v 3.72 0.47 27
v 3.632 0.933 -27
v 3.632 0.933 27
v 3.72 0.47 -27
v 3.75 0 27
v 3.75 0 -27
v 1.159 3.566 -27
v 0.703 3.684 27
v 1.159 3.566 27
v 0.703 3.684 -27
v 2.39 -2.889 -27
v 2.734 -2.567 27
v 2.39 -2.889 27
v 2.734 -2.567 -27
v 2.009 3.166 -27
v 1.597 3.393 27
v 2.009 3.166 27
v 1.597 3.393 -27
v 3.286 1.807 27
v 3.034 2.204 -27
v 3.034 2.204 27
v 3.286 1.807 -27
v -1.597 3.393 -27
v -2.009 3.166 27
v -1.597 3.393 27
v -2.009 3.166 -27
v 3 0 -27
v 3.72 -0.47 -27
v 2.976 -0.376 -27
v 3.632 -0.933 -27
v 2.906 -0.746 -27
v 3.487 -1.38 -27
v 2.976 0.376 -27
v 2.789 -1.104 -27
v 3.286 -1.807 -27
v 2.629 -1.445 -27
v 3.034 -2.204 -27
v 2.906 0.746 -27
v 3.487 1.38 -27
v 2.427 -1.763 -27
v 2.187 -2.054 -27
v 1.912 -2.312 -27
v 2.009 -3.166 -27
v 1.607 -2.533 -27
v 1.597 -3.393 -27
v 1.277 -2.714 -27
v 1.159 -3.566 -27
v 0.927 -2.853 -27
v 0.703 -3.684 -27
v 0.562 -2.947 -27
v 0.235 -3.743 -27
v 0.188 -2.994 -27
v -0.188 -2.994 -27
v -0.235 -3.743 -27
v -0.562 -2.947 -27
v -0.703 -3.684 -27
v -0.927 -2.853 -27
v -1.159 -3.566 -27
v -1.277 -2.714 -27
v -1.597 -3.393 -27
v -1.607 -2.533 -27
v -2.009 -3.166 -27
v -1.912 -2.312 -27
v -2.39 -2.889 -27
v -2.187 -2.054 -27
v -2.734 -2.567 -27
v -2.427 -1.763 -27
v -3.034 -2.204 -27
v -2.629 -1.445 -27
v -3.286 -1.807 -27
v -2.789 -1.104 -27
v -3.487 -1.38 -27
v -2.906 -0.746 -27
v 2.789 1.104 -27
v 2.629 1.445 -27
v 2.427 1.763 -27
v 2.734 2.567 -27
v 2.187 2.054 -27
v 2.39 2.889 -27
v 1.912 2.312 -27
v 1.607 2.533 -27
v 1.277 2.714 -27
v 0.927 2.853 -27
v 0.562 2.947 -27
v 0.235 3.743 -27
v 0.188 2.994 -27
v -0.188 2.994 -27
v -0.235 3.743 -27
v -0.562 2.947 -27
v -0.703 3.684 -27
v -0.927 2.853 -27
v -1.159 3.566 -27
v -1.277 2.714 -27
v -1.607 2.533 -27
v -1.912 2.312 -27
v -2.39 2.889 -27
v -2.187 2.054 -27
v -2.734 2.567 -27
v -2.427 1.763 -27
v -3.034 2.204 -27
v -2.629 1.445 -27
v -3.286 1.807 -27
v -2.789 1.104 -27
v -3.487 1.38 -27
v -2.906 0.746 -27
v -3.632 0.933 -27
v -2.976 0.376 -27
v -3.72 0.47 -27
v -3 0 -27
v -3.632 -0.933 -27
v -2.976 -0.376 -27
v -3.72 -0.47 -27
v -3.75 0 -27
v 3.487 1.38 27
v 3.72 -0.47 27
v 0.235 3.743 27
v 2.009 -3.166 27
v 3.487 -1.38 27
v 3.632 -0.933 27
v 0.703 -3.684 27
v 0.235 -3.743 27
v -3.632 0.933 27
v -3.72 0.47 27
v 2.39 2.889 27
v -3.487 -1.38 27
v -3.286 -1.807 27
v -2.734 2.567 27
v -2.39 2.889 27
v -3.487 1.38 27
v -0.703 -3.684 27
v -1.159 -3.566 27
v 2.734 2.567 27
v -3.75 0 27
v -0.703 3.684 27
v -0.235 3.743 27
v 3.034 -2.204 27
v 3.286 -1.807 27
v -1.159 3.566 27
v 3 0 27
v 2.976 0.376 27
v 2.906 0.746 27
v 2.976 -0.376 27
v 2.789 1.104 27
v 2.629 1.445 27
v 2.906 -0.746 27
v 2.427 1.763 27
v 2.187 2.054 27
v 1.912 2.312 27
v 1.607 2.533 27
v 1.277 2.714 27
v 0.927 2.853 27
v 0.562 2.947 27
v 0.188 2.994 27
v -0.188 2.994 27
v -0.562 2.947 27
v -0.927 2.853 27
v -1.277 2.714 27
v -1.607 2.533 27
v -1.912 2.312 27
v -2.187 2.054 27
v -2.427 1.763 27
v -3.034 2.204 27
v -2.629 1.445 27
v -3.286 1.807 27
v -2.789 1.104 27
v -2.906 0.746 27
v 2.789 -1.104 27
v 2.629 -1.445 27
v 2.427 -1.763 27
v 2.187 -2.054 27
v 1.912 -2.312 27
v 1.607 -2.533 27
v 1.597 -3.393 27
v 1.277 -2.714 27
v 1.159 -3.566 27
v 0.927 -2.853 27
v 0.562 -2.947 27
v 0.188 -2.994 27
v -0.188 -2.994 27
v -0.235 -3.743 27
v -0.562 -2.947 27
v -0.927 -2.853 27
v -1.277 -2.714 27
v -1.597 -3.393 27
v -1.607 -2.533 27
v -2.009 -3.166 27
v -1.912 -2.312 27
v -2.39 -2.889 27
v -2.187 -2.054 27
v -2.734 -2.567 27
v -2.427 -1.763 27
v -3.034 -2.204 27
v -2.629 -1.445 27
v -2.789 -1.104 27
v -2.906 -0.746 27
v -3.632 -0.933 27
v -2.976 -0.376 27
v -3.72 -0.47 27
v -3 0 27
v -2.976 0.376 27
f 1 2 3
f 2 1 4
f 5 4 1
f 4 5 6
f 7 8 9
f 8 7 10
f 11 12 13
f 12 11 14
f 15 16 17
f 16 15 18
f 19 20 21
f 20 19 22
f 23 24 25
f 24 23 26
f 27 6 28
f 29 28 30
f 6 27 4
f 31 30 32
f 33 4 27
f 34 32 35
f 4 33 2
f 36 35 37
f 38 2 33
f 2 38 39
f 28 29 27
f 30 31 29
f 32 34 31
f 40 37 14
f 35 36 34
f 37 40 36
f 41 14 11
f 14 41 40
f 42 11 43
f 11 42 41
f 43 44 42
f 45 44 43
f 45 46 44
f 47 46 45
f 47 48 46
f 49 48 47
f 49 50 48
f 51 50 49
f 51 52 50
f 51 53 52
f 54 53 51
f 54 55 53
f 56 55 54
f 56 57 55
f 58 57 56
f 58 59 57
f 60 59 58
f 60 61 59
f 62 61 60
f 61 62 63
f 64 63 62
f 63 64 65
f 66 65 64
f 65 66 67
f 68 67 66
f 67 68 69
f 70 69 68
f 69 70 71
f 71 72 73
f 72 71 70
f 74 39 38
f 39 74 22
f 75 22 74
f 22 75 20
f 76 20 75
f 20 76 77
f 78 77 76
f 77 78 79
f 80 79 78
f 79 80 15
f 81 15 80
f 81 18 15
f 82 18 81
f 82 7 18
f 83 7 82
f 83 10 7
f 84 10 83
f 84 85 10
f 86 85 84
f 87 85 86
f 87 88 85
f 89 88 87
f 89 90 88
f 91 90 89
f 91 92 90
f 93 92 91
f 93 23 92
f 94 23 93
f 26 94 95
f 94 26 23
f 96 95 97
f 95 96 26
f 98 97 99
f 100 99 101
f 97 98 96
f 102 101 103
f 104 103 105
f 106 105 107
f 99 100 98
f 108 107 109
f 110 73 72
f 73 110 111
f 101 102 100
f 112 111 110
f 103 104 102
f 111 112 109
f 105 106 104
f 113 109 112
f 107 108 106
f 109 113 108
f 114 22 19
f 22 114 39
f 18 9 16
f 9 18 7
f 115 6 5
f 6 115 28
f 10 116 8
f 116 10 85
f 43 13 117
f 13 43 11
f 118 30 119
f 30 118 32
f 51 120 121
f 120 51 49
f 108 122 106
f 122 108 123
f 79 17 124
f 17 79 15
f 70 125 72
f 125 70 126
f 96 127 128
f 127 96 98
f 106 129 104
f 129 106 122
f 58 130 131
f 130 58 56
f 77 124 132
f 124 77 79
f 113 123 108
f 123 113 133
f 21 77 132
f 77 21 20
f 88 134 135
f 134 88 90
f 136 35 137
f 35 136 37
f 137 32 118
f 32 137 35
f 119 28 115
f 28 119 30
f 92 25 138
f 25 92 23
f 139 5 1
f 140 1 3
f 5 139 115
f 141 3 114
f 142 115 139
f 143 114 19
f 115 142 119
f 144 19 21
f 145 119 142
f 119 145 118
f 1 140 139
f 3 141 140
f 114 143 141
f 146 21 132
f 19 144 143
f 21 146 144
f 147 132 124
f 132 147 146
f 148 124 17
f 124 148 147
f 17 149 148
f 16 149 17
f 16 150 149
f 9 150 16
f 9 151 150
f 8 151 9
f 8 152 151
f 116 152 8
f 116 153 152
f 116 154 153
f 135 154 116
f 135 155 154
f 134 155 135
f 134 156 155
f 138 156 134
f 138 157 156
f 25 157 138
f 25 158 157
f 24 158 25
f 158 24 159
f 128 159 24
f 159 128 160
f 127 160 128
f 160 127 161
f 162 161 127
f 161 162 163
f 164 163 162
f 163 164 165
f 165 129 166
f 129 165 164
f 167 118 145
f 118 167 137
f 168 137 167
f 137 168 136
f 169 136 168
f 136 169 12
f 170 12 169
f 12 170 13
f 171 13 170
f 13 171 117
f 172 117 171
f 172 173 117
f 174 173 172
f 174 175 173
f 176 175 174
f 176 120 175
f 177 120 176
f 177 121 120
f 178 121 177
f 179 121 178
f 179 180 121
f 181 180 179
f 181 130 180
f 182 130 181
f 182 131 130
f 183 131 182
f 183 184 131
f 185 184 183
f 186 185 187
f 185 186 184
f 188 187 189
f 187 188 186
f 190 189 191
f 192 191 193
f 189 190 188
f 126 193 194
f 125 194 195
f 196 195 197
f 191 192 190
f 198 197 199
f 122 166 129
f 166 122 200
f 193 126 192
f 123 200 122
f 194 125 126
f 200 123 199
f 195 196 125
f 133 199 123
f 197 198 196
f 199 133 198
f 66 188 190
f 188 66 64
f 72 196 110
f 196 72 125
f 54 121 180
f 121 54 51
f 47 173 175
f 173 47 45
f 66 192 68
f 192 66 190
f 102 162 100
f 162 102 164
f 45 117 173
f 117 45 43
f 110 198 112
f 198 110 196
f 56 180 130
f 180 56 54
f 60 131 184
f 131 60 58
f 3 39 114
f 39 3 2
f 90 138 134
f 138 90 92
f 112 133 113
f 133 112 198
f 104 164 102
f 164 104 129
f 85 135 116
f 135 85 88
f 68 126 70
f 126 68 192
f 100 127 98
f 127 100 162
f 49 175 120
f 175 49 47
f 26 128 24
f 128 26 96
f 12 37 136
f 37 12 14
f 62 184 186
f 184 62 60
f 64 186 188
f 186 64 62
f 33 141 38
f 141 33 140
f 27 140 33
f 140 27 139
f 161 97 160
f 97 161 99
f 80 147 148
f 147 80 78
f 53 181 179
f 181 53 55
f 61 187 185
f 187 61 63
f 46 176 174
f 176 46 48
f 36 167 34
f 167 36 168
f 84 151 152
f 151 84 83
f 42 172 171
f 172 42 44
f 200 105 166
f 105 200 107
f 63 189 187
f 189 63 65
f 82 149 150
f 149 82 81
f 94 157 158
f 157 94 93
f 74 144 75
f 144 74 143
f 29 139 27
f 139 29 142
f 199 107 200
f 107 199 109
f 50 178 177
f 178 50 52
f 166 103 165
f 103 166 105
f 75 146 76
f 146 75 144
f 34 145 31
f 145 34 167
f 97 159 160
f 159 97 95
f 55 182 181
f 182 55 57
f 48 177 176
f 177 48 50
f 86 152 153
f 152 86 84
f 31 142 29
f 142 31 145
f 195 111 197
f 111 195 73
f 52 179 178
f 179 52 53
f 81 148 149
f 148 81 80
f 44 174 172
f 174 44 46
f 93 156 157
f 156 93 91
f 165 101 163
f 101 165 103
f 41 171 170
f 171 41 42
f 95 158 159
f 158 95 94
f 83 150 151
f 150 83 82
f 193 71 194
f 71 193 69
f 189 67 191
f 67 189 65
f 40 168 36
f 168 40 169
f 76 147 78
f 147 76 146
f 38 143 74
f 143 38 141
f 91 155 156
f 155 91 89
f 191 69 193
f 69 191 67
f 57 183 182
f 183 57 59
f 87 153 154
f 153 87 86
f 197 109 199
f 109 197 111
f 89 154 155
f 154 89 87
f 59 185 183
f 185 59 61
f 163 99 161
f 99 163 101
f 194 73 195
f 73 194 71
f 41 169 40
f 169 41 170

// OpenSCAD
$fn = 50;


difference() {
	union() {
		translate(v = [0, 0, -27.0000000000]) {
			cylinder(h = 54, r = 3.7500000000);
		}
	}
	union() {
		translate(v = [0, 0, -100.0000000000]) {
			cylinder(h = 200, r = 3.0000000000);
		}
	}
}
